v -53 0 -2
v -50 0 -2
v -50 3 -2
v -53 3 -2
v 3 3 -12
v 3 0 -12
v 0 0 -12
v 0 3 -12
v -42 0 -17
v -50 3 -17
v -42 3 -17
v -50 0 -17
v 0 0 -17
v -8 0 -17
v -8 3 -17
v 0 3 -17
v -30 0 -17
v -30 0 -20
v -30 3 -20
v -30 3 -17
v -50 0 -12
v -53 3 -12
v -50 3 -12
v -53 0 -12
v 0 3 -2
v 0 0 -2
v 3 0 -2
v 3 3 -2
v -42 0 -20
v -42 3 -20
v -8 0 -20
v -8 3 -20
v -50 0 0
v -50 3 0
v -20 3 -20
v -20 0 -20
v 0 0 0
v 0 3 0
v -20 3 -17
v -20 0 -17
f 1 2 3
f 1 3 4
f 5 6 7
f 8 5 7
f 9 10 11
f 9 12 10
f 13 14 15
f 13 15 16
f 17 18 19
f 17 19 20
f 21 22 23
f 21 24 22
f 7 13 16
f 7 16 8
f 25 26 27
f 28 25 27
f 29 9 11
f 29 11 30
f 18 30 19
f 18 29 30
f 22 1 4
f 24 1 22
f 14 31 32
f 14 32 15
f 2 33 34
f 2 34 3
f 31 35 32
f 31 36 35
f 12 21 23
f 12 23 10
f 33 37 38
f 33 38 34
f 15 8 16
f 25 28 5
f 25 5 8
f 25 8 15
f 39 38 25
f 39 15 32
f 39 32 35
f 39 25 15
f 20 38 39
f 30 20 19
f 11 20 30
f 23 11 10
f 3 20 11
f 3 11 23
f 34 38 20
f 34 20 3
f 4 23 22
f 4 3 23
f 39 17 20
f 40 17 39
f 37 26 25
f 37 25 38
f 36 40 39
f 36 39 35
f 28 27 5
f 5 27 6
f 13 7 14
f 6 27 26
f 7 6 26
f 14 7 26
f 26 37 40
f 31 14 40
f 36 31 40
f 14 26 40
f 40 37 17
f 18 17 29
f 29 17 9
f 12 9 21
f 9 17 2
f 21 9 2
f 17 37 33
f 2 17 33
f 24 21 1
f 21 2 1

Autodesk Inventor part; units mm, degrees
ref_plane "YZ Plane" through (0, 0, 0) normal (1, 0, 0) x (0, 1, 0)
ref_plane "XZ Plane" through (0, 0, 0) normal (0, 1, 0) x (-1, 0, 0)
ref_plane "XY Plane" through (0, 0, 0) normal (0, 0, 1) x (1, 0, 0)
sketch "Sketch1" plane through (0, 0, 0) normal (0, 1, 0) x (-1, 0, 0)
  line L0 (0, 0) -> (50, 0)
  line L1 (50, 0) -> (50, -20)
  line L2 (50, -20) -> (0, -20)
  line L3 (0, -20) -> (0, 0)
  line L4 (50, -2) -> (53, -2)
  line L5 (53, -2) -> (53, -12)
  line L6 (53, -12) -> (50, -12)
  line L7 (25, -20) -> (25, 0) construction
  line L8 (0, -2) -> (-3, -2)
  line L9 (-3, -2) -> (-3, -12)
  line L10 (-3, -12) -> (0, -12)
  line L11 (50, -17) -> (42, -17)
  line L12 (42, -17) -> (42, -20)
  line L13 (8, -20) -> (8, -17)
  line L14 (8, -17) -> (0, -17)
  line L15 (30, -17) -> (20, -17)
  line L16 (20, -17) -> (20, -20)
  line L17 (20, -20) -> (30, -20)
  line L18 (30, -20) -> (30, -17)
  point P0 (25, -17)
  point P1 (30, -20)
  dimension "d0" = 20
  dimension "d1" = 50
  dimension "d2" = 2
  dimension "d3" = 10
  dimension "d4" = 3
  dimension "d7" = 8
  dimension "d8" = 3
  dimension "d9" = 10
extrude "Extrusion1" add sketch "Sketch1" along normal blind 3 contours L0 L1 L11 L12 L2 L18 L15 L16 L13 L14 L3 | L3 L10 L9 L8 | L4 L5 L6 L1
properties part number "soporte_base_parqueo"
